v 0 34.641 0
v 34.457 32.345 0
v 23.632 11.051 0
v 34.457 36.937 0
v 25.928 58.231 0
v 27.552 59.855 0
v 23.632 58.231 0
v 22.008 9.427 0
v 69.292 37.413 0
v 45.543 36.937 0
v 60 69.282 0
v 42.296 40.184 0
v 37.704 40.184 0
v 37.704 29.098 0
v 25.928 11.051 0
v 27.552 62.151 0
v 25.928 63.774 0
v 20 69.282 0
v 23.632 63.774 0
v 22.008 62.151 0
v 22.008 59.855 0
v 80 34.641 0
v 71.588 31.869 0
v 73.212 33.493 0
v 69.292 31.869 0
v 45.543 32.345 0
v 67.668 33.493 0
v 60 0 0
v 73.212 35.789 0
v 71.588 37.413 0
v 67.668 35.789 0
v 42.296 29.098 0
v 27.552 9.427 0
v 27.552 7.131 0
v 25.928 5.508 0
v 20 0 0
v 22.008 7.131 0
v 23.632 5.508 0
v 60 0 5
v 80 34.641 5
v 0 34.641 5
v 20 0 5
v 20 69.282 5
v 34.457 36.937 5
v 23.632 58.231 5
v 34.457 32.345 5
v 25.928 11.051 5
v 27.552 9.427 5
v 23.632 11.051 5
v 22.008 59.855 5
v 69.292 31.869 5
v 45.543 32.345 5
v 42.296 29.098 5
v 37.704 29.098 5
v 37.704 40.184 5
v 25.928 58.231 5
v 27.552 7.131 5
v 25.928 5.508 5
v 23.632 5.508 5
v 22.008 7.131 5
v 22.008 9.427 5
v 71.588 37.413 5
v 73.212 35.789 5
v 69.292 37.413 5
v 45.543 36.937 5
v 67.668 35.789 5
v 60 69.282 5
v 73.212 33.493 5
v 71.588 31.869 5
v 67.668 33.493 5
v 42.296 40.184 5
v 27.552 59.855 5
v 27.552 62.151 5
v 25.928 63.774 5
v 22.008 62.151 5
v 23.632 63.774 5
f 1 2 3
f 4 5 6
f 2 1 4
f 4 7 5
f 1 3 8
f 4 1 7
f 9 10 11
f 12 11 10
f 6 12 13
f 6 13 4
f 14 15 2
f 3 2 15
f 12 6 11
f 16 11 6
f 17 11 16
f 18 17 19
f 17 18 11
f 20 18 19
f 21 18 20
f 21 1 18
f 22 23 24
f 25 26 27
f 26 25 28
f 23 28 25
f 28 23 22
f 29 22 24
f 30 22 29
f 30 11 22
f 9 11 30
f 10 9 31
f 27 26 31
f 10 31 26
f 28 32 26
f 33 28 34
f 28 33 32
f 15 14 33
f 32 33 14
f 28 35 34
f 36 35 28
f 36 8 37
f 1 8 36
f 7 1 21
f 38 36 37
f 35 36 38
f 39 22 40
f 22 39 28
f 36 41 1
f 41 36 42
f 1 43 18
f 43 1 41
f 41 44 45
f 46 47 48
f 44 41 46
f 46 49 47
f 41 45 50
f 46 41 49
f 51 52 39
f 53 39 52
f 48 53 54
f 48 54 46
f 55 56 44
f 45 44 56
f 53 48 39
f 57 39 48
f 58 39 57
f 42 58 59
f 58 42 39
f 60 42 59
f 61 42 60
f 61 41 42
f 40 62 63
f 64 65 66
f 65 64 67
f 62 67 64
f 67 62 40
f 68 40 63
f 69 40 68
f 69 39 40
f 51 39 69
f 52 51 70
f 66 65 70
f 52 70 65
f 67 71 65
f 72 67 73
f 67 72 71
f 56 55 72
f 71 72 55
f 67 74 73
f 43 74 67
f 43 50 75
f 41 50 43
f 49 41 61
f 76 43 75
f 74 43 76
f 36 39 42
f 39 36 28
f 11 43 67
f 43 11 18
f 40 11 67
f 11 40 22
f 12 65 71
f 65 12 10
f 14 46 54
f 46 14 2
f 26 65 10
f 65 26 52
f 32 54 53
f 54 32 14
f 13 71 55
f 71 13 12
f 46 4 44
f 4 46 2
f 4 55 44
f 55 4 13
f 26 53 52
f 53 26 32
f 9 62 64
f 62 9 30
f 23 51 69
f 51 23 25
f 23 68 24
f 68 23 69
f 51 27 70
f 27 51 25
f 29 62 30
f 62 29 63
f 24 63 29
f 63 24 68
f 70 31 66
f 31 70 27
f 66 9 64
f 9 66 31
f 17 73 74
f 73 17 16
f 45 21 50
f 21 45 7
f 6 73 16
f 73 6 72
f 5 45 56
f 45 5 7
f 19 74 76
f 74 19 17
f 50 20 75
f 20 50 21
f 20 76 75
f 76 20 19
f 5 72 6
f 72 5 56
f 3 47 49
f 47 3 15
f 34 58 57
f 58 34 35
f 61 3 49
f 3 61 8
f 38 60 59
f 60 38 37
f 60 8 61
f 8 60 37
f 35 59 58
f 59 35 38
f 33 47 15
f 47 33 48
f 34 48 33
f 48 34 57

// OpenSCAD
$fn = 32;

// ----------------------------------------------------------------------
// Polygon plate: 6-gon R40, 3 bolt windows
// ----------------------------------------------------------------------

// --- parameters (mm) ---
sides = 6;                // number of polygon sides
plate_r = 40;             // circumscribed radius of the polygon
bore_r = 6;               // centre bore radius
bolts = 3;                // number of bolt windows
ring_r = 30.44;           // bolt-circle radius
bolt_r = 3;               // bolt window radius
plate_t = 5;              // plate thickness, Z (extrusion height)

plate_d = 2 * plate_r;  // circumscribed diameter
bore_d = 2 * bore_r;  // centre bore diameter
bolt_d = 2 * bolt_r;  // bolt window diameter
ring_d = 2 * ring_r;  // bolt-circle diameter

profile = [[80, 34.641], [60, 69.282], [20, 69.282], [0, 34.641], [20, 0], [60, 0]];  // primary outline, 6 points, counter clockwise
void_1 = [[45.543, 36.937], [42.296, 40.184], [37.704, 40.184], [34.457, 36.937], [34.457, 32.345], [37.704, 29.098], [42.296, 29.098], [45.543, 32.345]];  // centre bore, 8 points
void_2 = [[73.212, 35.789], [71.588, 37.413], [69.292, 37.413], [67.668, 35.789], [67.668, 33.493], [69.292, 31.869], [71.588, 31.869], [73.212, 33.493]];  // bolt window 1, 8 points
void_3 = [[27.552, 62.151], [25.928, 63.774], [23.632, 63.774], [22.008, 62.151], [22.008, 59.855], [23.632, 58.231], [25.928, 58.231], [27.552, 59.855]];  // bolt window 2, 8 points
void_4 = [[27.552, 9.427], [25.928, 11.051], [23.632, 11.051], [22.008, 9.427], [22.008, 7.131], [23.632, 5.508], [25.928, 5.508], [27.552, 7.131]];  // bolt window 3, 8 points

// --- the one profile operation ---
difference() {
  linear_extrude(height = plate_t) polygon(points = profile);
  translate([0, 0, -1])
    linear_extrude(height = plate_t + 2) polygon(points = void_1);
  translate([0, 0, -1])
    linear_extrude(height = plate_t + 2) polygon(points = void_2);
  translate([0, 0, -1])
    linear_extrude(height = plate_t + 2) polygon(points = void_3);
  translate([0, 0, -1])
    linear_extrude(height = plate_t + 2) polygon(points = void_4);
}
